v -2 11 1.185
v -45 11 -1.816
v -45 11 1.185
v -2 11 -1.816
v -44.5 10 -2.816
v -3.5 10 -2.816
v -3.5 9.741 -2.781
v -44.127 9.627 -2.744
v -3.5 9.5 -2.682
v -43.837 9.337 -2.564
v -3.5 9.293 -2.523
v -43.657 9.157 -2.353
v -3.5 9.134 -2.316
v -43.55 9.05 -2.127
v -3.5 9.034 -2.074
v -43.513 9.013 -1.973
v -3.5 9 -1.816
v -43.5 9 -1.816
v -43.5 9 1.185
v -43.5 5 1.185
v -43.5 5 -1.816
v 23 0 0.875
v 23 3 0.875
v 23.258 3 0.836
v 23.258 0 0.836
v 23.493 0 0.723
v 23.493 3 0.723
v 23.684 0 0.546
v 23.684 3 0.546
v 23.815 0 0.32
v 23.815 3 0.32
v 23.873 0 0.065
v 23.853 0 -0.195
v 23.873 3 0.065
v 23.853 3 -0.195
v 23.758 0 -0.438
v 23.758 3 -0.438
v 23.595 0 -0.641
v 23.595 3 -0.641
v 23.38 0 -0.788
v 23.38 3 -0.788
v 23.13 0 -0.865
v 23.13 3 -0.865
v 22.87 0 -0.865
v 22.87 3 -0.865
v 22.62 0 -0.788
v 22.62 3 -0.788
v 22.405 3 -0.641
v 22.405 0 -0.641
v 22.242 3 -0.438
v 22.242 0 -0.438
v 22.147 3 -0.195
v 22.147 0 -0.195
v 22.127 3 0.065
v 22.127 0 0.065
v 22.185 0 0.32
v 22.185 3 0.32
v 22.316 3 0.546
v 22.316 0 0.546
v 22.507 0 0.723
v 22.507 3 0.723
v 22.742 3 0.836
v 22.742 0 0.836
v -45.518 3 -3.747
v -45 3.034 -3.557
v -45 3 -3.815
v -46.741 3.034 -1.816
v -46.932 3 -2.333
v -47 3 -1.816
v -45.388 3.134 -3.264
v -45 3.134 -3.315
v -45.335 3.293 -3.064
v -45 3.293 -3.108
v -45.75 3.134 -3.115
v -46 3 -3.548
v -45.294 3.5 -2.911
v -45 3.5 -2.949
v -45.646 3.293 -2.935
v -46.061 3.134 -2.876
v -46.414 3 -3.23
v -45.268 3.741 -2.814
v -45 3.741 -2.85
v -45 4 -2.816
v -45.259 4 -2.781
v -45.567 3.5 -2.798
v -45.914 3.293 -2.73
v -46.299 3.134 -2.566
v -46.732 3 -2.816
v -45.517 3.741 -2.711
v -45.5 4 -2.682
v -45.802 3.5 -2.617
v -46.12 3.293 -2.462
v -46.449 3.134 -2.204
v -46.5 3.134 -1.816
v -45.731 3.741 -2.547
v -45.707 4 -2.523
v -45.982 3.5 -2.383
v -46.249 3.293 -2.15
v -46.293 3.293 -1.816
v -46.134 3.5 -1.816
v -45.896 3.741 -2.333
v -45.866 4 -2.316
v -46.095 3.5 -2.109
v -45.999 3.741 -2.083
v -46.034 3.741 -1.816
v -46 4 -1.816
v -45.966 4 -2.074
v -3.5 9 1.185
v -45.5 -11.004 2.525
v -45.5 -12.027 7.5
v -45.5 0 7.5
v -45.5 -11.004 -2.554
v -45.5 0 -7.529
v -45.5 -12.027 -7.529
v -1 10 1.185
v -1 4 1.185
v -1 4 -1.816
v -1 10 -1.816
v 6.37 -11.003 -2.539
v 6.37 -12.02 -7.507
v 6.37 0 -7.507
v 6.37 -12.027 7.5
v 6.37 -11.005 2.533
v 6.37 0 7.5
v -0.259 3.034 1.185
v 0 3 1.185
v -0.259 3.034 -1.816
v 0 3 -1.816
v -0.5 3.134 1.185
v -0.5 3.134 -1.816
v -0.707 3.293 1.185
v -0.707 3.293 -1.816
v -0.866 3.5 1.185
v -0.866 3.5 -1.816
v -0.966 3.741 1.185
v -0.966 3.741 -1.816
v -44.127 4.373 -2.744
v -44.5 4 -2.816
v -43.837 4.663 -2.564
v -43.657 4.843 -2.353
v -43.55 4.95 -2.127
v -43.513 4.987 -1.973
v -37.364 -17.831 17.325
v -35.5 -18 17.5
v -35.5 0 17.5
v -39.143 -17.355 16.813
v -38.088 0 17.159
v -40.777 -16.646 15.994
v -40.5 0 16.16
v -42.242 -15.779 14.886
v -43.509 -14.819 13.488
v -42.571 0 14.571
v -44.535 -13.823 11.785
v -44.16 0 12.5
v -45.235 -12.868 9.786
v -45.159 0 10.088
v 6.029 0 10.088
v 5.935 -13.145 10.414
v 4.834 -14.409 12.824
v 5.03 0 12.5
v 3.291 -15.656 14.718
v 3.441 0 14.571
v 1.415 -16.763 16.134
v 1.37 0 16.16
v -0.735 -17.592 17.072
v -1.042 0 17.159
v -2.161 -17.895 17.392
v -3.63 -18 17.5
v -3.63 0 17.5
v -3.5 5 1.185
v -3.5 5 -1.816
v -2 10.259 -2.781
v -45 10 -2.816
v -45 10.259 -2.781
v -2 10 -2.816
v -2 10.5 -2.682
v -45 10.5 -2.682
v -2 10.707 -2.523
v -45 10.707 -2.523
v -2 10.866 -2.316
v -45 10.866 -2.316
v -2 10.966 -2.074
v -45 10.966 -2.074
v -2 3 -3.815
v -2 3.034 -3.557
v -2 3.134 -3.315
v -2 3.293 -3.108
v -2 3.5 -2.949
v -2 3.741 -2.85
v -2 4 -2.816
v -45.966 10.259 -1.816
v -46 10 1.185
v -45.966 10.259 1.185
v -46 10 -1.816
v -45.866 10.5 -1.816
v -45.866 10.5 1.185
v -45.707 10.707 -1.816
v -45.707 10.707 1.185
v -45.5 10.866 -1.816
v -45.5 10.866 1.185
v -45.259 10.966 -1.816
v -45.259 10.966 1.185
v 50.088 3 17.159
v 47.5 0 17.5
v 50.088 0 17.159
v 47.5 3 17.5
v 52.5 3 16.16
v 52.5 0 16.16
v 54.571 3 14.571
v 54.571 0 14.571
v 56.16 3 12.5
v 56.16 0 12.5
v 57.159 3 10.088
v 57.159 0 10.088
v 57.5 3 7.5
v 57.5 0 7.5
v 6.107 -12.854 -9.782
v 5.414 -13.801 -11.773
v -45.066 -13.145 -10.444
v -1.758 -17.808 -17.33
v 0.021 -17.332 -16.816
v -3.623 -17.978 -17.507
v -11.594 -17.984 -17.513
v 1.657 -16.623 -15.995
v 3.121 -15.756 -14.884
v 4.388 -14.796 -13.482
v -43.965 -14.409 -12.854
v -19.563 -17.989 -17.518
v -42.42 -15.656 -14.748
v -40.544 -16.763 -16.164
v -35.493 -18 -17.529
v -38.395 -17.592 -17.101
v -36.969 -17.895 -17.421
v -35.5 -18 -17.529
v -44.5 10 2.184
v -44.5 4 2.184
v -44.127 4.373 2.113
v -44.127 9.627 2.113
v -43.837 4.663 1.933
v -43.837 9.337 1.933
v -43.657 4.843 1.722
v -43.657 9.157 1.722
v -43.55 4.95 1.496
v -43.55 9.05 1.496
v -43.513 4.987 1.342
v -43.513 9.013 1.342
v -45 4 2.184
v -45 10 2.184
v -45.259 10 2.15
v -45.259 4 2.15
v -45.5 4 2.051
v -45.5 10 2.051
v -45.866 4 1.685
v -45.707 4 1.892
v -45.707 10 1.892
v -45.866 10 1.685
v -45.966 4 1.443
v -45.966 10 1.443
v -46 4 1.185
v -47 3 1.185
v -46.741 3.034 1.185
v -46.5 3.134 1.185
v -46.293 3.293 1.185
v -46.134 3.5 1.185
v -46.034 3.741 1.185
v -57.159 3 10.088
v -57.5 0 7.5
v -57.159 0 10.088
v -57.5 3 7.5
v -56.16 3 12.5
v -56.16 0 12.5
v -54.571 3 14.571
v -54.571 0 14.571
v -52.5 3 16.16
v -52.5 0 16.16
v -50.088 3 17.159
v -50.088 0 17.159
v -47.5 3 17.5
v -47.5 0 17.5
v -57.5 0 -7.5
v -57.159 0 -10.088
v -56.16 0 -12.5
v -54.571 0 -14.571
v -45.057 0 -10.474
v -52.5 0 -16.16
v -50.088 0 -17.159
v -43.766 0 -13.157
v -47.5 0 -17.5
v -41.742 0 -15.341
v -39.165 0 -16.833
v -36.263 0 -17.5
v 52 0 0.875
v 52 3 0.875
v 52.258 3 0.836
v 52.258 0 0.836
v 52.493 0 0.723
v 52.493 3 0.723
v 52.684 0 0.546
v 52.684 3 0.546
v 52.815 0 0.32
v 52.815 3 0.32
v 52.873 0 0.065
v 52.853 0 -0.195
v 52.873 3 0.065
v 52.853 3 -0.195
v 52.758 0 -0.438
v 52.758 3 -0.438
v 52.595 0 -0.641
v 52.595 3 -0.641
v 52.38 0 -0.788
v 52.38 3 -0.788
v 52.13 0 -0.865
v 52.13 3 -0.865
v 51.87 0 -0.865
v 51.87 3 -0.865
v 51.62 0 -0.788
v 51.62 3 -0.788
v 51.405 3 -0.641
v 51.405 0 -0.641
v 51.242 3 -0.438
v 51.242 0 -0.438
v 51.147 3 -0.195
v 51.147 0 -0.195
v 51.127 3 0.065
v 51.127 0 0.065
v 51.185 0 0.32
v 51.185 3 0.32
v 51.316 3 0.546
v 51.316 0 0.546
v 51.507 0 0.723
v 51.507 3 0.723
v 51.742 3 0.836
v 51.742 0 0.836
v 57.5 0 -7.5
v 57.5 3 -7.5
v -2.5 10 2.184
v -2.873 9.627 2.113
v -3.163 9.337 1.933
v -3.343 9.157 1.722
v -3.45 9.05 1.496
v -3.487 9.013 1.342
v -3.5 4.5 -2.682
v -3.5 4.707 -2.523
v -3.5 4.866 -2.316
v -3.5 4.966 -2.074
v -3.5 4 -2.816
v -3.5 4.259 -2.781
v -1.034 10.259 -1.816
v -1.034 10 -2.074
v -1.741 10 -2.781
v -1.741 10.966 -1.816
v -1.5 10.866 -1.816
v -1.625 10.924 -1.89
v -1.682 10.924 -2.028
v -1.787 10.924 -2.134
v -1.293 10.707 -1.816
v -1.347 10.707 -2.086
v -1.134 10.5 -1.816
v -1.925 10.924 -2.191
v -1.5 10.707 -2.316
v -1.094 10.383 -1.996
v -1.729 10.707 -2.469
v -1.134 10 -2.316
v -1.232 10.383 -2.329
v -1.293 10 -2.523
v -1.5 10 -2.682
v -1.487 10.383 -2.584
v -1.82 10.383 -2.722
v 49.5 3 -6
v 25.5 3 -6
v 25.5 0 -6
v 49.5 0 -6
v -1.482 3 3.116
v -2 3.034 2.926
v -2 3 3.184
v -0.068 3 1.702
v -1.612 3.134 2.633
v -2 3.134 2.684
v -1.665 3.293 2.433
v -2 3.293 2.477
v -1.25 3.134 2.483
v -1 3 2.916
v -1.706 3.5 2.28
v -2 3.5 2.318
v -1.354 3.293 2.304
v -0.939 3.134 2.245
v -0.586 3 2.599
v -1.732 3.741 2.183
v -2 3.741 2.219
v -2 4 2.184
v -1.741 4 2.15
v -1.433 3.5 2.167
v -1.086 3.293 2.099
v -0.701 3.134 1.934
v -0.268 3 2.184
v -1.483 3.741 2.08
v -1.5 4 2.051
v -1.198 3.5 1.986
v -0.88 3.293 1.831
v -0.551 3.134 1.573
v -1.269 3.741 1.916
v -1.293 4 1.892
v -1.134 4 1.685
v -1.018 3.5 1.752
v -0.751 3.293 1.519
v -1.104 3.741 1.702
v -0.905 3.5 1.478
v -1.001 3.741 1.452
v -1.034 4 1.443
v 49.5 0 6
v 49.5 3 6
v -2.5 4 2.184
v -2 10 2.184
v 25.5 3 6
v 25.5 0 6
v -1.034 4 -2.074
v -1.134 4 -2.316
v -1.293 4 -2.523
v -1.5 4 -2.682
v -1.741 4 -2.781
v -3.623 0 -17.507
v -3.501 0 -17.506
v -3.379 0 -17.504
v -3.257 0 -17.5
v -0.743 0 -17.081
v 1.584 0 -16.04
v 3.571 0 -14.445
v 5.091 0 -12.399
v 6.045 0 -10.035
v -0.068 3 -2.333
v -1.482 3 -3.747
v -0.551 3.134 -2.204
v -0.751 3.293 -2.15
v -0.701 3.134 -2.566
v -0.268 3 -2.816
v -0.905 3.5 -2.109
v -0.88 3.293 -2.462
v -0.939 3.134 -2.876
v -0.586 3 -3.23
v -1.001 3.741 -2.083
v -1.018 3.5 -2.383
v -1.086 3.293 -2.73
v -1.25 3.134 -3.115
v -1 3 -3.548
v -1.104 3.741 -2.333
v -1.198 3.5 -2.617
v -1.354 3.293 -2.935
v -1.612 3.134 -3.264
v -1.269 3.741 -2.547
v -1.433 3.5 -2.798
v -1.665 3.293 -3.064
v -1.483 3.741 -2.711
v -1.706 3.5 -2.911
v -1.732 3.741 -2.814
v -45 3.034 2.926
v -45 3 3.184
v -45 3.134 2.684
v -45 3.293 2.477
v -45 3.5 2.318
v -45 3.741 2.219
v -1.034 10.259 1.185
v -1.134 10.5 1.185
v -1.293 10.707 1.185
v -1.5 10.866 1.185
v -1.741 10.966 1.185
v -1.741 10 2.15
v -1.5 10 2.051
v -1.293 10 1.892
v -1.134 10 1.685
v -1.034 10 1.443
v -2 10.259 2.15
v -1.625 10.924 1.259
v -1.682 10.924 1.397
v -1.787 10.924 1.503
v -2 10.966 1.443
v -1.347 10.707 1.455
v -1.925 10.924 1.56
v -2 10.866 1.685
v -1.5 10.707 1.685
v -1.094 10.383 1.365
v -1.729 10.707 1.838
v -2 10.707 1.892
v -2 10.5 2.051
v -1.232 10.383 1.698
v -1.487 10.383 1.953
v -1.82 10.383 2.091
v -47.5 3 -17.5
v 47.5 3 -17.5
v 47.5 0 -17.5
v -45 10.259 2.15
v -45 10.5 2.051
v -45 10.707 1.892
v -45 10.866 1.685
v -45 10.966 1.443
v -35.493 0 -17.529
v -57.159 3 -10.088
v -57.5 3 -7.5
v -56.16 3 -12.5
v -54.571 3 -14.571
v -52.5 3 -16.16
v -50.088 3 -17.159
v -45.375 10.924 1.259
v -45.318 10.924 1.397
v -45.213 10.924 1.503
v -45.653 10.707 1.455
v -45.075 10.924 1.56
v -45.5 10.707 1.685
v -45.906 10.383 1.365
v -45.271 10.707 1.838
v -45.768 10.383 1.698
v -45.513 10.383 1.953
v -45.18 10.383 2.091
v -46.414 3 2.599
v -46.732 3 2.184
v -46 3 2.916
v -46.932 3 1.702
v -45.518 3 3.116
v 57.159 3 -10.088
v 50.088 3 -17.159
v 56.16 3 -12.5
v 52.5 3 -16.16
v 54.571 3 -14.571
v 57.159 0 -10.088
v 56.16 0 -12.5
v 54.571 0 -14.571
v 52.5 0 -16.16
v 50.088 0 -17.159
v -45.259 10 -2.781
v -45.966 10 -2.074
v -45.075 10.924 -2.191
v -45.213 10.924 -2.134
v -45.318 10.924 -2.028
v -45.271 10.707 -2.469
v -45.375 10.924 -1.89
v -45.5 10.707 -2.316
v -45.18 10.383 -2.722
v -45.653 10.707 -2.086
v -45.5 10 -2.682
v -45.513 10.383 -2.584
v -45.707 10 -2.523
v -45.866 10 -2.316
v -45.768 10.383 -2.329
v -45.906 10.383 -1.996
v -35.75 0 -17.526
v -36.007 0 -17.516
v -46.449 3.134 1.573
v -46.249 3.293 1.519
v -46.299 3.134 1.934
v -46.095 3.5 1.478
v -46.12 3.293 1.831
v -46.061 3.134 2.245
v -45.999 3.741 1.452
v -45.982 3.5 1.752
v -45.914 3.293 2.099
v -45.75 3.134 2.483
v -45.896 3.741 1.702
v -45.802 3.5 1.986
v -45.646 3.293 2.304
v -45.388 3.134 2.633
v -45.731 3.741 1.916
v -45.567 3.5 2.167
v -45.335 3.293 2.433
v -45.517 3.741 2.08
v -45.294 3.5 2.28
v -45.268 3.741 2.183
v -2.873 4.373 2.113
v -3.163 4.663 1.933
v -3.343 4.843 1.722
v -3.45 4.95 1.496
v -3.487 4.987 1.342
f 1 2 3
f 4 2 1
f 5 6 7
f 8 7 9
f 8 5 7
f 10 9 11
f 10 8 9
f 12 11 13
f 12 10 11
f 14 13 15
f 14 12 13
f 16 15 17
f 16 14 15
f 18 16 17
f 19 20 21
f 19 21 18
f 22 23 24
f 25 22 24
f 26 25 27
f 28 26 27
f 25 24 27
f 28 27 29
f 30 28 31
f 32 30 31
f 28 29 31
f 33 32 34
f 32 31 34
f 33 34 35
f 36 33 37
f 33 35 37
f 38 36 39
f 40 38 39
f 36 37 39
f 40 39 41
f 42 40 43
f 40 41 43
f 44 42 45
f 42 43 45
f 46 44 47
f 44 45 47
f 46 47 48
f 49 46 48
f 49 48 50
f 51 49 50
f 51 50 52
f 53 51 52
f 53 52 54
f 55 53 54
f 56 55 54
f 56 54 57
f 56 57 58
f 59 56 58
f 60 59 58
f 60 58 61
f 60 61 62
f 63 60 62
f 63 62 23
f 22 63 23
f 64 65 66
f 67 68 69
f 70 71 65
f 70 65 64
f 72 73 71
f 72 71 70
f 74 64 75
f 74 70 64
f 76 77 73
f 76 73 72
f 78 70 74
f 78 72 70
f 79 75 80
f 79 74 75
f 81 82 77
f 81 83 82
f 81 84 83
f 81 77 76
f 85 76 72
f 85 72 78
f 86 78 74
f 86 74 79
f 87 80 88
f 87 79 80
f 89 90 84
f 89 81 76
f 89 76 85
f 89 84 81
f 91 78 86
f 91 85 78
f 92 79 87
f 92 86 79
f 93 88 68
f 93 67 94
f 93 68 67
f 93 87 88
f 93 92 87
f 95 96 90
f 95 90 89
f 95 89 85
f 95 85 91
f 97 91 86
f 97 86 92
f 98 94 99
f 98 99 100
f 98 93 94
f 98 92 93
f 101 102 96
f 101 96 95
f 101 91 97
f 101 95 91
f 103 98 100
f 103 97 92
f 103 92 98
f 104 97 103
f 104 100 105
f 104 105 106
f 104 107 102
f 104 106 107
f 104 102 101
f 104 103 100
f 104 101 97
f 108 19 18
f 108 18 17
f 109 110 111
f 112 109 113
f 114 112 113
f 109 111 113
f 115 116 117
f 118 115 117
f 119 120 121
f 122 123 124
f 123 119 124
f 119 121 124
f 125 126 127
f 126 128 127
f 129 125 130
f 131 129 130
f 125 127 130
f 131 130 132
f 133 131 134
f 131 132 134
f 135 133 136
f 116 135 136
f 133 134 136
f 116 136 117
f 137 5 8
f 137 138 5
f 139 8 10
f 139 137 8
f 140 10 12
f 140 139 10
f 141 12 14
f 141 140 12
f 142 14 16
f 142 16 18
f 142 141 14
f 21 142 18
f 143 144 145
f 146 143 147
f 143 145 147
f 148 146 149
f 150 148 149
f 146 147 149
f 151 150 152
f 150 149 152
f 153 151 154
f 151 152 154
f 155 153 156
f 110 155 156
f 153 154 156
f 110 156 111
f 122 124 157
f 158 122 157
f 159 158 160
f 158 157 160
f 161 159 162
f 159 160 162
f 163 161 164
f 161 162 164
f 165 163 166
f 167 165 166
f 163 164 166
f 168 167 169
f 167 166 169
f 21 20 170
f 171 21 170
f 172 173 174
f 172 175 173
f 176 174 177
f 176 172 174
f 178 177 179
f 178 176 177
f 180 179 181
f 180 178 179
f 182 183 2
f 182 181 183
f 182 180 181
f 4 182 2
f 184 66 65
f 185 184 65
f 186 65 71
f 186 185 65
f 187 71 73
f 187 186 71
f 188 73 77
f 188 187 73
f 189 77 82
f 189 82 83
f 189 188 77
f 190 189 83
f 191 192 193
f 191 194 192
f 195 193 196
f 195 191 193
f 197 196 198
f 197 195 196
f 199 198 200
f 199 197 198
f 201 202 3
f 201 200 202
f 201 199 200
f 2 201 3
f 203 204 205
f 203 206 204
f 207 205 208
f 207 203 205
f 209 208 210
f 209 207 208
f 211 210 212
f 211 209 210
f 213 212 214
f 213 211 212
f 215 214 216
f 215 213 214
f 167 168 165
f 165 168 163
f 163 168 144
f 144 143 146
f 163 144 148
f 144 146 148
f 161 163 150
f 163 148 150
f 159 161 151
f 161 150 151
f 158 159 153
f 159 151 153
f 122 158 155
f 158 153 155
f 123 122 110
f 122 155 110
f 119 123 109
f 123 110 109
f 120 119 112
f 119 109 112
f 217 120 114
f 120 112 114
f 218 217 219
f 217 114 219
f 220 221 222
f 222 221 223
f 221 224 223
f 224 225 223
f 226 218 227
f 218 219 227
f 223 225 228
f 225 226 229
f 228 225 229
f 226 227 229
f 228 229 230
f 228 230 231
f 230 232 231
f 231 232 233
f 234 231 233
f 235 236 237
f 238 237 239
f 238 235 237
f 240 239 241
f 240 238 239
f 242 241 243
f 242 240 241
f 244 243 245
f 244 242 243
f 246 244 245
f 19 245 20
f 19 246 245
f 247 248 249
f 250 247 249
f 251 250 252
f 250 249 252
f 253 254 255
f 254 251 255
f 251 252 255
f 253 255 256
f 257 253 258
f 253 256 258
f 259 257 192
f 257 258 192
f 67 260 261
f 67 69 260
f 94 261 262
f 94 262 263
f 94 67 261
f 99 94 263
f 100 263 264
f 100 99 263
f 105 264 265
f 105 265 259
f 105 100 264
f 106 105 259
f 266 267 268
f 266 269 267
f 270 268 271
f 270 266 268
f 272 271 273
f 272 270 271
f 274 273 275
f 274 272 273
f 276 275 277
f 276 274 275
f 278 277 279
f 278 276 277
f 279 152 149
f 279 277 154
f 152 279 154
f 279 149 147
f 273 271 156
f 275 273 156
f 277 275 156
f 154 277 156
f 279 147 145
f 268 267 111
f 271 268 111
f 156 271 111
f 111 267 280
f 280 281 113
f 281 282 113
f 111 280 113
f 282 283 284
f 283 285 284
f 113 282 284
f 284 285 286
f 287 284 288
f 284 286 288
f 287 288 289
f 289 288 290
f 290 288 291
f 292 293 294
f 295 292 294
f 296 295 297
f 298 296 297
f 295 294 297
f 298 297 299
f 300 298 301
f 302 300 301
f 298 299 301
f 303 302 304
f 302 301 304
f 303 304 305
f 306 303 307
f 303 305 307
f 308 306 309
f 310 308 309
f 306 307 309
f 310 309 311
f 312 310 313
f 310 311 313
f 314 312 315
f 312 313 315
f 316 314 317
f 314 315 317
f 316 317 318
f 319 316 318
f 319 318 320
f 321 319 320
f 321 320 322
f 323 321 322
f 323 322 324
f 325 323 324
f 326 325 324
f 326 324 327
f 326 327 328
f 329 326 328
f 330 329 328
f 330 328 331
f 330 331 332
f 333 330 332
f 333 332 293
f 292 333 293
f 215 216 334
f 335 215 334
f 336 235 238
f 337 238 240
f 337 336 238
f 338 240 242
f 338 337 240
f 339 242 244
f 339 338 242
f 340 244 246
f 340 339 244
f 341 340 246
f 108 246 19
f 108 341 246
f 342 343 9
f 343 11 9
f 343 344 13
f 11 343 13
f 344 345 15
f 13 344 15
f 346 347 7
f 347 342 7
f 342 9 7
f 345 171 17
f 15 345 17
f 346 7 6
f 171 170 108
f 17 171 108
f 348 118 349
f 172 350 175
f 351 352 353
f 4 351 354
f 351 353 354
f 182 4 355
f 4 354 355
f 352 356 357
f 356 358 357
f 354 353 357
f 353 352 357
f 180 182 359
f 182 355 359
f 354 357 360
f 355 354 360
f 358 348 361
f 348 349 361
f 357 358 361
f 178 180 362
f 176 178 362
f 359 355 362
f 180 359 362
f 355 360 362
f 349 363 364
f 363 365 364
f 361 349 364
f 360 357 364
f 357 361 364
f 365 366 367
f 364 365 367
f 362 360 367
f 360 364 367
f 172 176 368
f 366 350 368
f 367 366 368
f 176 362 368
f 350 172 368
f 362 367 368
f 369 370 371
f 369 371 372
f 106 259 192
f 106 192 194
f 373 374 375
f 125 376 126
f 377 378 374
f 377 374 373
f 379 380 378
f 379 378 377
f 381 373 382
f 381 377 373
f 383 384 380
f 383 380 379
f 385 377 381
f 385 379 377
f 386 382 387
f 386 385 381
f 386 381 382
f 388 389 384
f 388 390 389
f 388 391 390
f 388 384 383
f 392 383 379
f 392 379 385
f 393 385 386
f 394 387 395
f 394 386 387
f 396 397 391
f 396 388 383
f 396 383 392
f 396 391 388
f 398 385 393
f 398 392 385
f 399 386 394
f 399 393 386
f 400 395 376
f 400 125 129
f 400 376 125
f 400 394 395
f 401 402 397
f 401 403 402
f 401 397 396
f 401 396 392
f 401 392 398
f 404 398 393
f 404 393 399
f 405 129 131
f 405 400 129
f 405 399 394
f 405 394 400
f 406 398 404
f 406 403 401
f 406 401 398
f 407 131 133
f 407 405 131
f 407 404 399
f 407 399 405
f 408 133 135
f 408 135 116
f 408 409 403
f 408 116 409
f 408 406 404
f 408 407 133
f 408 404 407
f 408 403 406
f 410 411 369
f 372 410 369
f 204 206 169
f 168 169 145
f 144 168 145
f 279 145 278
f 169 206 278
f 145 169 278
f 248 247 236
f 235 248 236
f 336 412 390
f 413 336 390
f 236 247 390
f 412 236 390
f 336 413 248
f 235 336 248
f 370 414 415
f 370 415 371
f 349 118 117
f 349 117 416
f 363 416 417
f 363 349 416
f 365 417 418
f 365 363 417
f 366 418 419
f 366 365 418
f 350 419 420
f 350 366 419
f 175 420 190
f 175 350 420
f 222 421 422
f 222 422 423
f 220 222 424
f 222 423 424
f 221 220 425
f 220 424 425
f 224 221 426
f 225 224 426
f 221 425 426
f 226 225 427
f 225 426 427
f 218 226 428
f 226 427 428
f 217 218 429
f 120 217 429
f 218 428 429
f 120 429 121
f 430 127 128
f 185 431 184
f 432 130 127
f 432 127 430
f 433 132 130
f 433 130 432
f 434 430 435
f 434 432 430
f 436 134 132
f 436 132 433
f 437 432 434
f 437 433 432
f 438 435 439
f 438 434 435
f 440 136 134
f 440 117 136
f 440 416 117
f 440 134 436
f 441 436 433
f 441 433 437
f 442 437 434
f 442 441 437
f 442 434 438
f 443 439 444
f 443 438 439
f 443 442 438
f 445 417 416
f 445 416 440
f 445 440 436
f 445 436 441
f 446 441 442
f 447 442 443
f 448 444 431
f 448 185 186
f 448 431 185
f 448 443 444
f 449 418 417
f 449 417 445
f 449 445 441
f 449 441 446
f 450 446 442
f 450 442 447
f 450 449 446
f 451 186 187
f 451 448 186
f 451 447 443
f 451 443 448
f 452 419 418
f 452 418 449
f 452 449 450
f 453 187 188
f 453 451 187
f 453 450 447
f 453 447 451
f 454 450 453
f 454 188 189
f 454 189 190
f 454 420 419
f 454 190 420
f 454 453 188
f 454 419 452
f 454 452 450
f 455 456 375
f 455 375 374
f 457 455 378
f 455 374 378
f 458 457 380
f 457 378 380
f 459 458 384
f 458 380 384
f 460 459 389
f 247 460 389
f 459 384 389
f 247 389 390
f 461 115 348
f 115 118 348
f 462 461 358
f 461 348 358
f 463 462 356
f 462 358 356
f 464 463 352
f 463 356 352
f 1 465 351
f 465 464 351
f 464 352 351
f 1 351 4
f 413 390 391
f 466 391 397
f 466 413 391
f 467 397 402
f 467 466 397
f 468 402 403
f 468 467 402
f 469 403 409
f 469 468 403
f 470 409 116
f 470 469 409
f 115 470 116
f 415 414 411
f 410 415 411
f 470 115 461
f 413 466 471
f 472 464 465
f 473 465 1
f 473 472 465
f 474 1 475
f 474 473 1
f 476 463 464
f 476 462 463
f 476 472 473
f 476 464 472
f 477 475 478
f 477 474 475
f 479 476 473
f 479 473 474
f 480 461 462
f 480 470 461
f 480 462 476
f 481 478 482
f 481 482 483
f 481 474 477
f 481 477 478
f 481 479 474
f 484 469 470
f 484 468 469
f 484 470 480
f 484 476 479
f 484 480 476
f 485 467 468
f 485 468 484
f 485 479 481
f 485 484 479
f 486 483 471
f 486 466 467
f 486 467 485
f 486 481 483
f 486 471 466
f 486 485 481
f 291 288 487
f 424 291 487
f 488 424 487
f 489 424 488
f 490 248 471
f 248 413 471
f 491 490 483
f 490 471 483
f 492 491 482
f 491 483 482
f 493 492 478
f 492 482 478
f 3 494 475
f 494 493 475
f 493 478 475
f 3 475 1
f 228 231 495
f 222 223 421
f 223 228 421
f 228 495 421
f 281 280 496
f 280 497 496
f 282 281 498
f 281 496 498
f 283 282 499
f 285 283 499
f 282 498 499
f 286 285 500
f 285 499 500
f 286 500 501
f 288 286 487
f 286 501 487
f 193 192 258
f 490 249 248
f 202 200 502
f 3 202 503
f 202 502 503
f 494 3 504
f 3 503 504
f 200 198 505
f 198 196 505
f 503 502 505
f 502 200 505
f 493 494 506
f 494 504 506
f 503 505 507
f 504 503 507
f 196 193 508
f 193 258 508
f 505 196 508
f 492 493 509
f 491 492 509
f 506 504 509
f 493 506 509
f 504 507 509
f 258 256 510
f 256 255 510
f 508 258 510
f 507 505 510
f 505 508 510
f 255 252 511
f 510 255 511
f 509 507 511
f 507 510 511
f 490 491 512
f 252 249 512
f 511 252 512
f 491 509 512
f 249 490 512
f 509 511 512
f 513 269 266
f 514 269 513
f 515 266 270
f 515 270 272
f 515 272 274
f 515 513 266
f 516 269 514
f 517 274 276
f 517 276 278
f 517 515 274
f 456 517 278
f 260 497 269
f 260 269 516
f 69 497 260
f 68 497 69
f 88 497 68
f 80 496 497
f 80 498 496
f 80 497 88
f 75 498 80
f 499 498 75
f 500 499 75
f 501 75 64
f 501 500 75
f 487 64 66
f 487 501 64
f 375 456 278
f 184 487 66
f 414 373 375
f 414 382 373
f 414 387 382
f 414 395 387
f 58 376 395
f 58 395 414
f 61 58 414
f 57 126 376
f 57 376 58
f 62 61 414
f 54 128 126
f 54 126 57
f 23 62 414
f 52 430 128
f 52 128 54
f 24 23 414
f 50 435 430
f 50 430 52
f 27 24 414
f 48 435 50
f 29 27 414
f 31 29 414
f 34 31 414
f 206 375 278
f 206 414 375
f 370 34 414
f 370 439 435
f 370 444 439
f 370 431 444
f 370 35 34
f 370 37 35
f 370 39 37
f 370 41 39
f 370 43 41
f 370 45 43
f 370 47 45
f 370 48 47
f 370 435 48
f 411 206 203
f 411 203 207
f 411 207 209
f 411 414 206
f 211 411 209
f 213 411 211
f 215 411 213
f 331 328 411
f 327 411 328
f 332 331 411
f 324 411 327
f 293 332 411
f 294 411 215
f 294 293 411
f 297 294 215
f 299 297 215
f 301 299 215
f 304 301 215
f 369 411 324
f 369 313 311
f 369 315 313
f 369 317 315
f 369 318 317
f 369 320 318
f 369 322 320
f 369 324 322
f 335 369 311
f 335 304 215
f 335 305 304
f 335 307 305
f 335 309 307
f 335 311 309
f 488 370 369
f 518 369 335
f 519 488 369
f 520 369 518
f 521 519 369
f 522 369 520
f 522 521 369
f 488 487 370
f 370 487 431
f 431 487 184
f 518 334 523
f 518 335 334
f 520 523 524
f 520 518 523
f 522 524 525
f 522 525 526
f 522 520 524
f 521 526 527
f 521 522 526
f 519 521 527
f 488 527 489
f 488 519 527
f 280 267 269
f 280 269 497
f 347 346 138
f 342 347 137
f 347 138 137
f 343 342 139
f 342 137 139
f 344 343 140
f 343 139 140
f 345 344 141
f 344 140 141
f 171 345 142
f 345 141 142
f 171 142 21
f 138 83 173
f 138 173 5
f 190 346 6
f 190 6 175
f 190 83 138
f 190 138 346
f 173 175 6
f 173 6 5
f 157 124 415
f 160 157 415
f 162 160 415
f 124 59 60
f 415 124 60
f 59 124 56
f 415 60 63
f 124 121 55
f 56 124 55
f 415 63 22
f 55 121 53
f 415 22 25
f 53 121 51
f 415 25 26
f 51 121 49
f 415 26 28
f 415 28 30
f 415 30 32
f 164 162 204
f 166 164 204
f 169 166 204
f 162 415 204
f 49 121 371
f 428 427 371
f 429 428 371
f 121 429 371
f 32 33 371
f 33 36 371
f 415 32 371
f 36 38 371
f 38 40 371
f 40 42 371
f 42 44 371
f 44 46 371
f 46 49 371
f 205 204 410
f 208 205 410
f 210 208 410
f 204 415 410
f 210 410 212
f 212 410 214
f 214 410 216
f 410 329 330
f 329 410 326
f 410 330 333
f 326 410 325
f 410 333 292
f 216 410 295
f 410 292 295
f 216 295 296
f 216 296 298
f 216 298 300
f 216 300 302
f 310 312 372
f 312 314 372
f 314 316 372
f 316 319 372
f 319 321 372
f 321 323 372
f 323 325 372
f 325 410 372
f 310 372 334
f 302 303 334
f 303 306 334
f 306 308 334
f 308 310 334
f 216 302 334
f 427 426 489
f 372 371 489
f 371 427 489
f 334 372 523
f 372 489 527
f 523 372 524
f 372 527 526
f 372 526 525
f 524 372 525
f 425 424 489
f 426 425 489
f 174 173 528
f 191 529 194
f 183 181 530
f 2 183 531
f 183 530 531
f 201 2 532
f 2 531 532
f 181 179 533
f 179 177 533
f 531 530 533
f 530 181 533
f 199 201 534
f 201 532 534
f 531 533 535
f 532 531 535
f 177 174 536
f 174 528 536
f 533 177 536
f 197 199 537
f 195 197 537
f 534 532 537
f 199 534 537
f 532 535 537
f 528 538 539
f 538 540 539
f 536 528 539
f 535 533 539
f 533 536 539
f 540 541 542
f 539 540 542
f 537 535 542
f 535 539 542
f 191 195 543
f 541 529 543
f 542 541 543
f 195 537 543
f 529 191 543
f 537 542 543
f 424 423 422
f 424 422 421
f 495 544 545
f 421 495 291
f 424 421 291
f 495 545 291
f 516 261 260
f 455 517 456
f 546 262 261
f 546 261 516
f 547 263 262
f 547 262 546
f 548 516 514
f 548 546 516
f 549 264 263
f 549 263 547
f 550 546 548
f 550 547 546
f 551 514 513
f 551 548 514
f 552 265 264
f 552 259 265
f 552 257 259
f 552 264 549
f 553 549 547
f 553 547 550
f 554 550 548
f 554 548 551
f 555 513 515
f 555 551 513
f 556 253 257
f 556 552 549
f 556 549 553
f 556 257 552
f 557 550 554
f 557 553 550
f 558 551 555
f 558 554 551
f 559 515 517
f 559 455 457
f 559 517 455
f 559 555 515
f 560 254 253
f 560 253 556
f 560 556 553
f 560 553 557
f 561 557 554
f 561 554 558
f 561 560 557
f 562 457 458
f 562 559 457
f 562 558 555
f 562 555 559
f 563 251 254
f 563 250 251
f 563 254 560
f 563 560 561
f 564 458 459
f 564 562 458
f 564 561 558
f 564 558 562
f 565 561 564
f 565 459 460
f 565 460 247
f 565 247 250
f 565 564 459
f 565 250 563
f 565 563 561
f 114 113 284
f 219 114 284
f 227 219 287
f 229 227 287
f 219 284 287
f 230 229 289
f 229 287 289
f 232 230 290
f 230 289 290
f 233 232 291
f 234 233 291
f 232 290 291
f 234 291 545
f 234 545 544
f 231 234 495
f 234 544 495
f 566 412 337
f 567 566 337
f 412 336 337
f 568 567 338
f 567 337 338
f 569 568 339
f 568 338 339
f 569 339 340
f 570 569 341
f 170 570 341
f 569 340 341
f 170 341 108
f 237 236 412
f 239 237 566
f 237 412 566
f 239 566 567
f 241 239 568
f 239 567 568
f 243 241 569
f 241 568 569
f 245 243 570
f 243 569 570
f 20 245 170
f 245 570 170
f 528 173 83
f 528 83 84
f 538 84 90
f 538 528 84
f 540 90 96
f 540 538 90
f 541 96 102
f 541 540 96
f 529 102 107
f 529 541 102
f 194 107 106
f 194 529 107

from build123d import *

# Parameters (mm, degrees)
SKETCH1_W           = 115
SKETCH1_H           = 35
BOSS_EXTRUDE1_DEPTH = 3
FILLET1_R           = 10
SKETCH2_W           = 45
SKETCH2_H           = 5
BOSS_EXTRUDE2_DEPTH = 8
SKETCH3_W           = 40
SKETCH3_H           = 4
CUT_EXTRUDE1_DEPTH  = 62.763488753
FILLET2_R           = 1
SKETCH4_W           = 24
SKETCH4_H           = 12
CUT_EXTRUDE2_DEPTH  = 61.634148794
BOSS_EXTRUDE3_DEPTH = 18
FILLET3_R           = 10
FILLET4_R           = 10
SKETCH12_R          = 0.875
CUT_EXTRUDE3_DEPTH  = 64.675135077
CUT_EXTRUDE4_DEPTH  = 58


# Some blends are built 0.0001 mm under size
with BuildPart() as part:
    # Sketch1 → Boss-Extrude1 (new body)
    with BuildSketch(Plane(origin=(0, 0, 0), x_dir=(1, 0, 0), z_dir=(0, 1, 0))):
        Rectangle(SKETCH1_W, SKETCH1_H)
    extrude(amount=BOSS_EXTRUDE1_DEPTH)

    # Fillet1
    fillet1_edges = [part.edges().sort_by_distance(p)[0] for p in [
        (-57.5, 1.5, -17.5),
        (57.5, 1.5, -17.5),
        (57.5, 1.5, 17.5),
        (-57.5, 1.5, 17.5),
    ]]
    fillet(fillet1_edges, radius=FILLET1_R)

    # Sketch2 → Boss-Extrude2 (add)
    with BuildSketch(Plane(origin=(0, 3, 0), x_dir=(1, 0, 0), z_dir=(0, 1, 0))):
        with Locations((-23.5, 0.315525333)):
            Rectangle(SKETCH2_W, SKETCH2_H)
    extrude(amount=BOSS_EXTRUDE2_DEPTH)

    # Sketch3 → Cut-Extrude1 (cut, through all)
    with BuildSketch(Plane.XY.offset(2.184474667)):
        with Locations((-23.5, 7)):
            Rectangle(SKETCH3_W, SKETCH3_H)
    extrude(amount=-CUT_EXTRUDE1_DEPTH, mode=Mode.SUBTRACT)

    # Fillet2
    fillet2_edges = [part.edges().sort_by_distance(p)[0] for p in [
        (-1, 3, -0.315525333),
        (-1, 7, 2.184474667),
        (-23.5, 3, -2.815525333),
        (-1, 7, -2.815525333),
        (-46, 3, -0.315525333),
        (-46, 7, -2.815525333),
        (-23.5, 3, 2.184474667),
        (-46, 7, 2.184474667),
        (-1, 11, -0.315525333),
        (-23.5, 11, -2.815525333),
        (-46, 11, -0.315525333),
        (-23.5, 11, 2.184474667),
        (-43.5, 7, -2.815525333),
        (-23.5, 9, -2.815525333),
        (-23.5, 5, -2.815525333),
        (-43.5, 7, 2.184474667),
        (-23.5, 5, 2.184474667),
        (-3.5, 7, 2.184474667),
        (-23.5, 9, 2.184474667),
    ]]
    fillet(fillet2_edges, radius=FILLET2_R - 0.0001)  # a hair under: the kernel refuses the full size

    # Sketch4 → Cut-Extrude2 (cut, through all)
    with BuildSketch(Plane(origin=(0, 3, 0), x_dir=(1, 0, 0), z_dir=(0, 1, 0))):
        with Locations((37.5, 0)):
            Rectangle(SKETCH4_W, SKETCH4_H)
    extrude(amount=-CUT_EXTRUDE2_DEPTH, mode=Mode.SUBTRACT)

    # Sketch11 → Boss-Extrude3 (add)
    with BuildSketch(Plane(origin=(0, 0, 0), x_dir=(-1, 0, 0), z_dir=(0, -1, 0))):
        Polygon((-6.369569975, 0), (-6.369569975, -17.5), (45.499835489, -17.5), (45.499835489, 17.536176175), (-6.369569975, 17.5), align=None)
    extrude(amount=BOSS_EXTRUDE3_DEPTH)

    # Fillet3
    # the kernel refuses this fillet: 10 mm, written as the material it takes off along each edge
    with BuildSketch(Plane(origin=(-45.499835489, 0, 17.5), x_dir=(1, 0, 0), z_dir=(0, -1, 0))) as fillet3_piece_1:
        with BuildLine():
            CenterArc((FILLET3_R, -FILLET3_R), FILLET3_R, 90, 90)
            Line((0, -FILLET3_R), (0, 0))
            Line((0, 0), (FILLET3_R, 0))
        make_face()
    extrude(amount=43, mode=Mode.SUBTRACT)
    with BuildSketch(Plane(origin=(-45.499835489, 0, -17.536176175), x_dir=(0, 0, 1), z_dir=(0, -1, 0))) as fillet3_piece_2:
        with BuildLine():
            CenterArc((FILLET3_R * 1.00069769048, -FILLET3_R), FILLET3_R, 90, 90.039960778)
            Line((FILLET3_R * 0.000697933699006, -FILLET3_R * 1.0006974471), (0, 0))
            Line((0, 0), (FILLET3_R * 1.00069769048, 0))
        make_face()
    extrude(amount=43.017442262, mode=Mode.SUBTRACT)

    # Fillet4
    # the kernel refuses this fillet: 10 mm, written as the material it takes off along each edge
    with BuildSketch(Plane(origin=(6.369569975, 0, -17.5), x_dir=(0, 0, 1), z_dir=(0, -1, 0))) as fillet4_piece_1:
        with BuildLine():
            CenterArc((FILLET4_R * 0.99930279595, FILLET4_R), FILLET4_R, 180.039960778, 89.960039222)
            Line((-FILLET4_R * 0.000696960833864, FILLET4_R * 0.999302552903), (0, 0))
            Line((0, 0), (FILLET4_R * 0.99930279595, 0))
        make_face()
    extrude(amount=42.982569899, mode=Mode.SUBTRACT)
    with BuildSketch(Plane(origin=(6.369569975, 0, 17.5), x_dir=(0, 0, -1), z_dir=(0, -1, 0))) as fillet4_piece_2:
        with BuildLine():
            CenterArc((FILLET4_R, -FILLET4_R), FILLET4_R, 90, 90)
            Line((0, -FILLET4_R), (0, 0))
            Line((0, 0), (FILLET4_R, 0))
        make_face()
    extrude(amount=43, mode=Mode.SUBTRACT)

    # Sketch12 → Cut-Extrude3 (cut, through all)
    with BuildSketch(Plane(origin=(0, 3, 0), x_dir=(1, 0, 0), z_dir=(0, 1, 0))):
        with Locations(Location((23, 0, 0), (0, 0, 270))):
            Circle(SKETCH12_R)
        with Locations(Location((52, 0, 0), (0, 0, 270))):
            Circle(SKETCH12_R)
    extrude(amount=-CUT_EXTRUDE3_DEPTH, mode=Mode.SUBTRACT)

    # Sketch13 → Cut-Extrude4 (cut)
    with BuildSketch(Plane.ZY.offset(45.499835489)):
        with BuildLine():
            Line((-17.52919927, -18), (17.5, -18))
            ThreePointArc((17.5, -18), (-0.014599635, -10.875312322), (-17.52919927, -18))
        make_face()
    extrude(amount=-CUT_EXTRUDE4_DEPTH, mode=Mode.SUBTRACT)


solid = part.part
